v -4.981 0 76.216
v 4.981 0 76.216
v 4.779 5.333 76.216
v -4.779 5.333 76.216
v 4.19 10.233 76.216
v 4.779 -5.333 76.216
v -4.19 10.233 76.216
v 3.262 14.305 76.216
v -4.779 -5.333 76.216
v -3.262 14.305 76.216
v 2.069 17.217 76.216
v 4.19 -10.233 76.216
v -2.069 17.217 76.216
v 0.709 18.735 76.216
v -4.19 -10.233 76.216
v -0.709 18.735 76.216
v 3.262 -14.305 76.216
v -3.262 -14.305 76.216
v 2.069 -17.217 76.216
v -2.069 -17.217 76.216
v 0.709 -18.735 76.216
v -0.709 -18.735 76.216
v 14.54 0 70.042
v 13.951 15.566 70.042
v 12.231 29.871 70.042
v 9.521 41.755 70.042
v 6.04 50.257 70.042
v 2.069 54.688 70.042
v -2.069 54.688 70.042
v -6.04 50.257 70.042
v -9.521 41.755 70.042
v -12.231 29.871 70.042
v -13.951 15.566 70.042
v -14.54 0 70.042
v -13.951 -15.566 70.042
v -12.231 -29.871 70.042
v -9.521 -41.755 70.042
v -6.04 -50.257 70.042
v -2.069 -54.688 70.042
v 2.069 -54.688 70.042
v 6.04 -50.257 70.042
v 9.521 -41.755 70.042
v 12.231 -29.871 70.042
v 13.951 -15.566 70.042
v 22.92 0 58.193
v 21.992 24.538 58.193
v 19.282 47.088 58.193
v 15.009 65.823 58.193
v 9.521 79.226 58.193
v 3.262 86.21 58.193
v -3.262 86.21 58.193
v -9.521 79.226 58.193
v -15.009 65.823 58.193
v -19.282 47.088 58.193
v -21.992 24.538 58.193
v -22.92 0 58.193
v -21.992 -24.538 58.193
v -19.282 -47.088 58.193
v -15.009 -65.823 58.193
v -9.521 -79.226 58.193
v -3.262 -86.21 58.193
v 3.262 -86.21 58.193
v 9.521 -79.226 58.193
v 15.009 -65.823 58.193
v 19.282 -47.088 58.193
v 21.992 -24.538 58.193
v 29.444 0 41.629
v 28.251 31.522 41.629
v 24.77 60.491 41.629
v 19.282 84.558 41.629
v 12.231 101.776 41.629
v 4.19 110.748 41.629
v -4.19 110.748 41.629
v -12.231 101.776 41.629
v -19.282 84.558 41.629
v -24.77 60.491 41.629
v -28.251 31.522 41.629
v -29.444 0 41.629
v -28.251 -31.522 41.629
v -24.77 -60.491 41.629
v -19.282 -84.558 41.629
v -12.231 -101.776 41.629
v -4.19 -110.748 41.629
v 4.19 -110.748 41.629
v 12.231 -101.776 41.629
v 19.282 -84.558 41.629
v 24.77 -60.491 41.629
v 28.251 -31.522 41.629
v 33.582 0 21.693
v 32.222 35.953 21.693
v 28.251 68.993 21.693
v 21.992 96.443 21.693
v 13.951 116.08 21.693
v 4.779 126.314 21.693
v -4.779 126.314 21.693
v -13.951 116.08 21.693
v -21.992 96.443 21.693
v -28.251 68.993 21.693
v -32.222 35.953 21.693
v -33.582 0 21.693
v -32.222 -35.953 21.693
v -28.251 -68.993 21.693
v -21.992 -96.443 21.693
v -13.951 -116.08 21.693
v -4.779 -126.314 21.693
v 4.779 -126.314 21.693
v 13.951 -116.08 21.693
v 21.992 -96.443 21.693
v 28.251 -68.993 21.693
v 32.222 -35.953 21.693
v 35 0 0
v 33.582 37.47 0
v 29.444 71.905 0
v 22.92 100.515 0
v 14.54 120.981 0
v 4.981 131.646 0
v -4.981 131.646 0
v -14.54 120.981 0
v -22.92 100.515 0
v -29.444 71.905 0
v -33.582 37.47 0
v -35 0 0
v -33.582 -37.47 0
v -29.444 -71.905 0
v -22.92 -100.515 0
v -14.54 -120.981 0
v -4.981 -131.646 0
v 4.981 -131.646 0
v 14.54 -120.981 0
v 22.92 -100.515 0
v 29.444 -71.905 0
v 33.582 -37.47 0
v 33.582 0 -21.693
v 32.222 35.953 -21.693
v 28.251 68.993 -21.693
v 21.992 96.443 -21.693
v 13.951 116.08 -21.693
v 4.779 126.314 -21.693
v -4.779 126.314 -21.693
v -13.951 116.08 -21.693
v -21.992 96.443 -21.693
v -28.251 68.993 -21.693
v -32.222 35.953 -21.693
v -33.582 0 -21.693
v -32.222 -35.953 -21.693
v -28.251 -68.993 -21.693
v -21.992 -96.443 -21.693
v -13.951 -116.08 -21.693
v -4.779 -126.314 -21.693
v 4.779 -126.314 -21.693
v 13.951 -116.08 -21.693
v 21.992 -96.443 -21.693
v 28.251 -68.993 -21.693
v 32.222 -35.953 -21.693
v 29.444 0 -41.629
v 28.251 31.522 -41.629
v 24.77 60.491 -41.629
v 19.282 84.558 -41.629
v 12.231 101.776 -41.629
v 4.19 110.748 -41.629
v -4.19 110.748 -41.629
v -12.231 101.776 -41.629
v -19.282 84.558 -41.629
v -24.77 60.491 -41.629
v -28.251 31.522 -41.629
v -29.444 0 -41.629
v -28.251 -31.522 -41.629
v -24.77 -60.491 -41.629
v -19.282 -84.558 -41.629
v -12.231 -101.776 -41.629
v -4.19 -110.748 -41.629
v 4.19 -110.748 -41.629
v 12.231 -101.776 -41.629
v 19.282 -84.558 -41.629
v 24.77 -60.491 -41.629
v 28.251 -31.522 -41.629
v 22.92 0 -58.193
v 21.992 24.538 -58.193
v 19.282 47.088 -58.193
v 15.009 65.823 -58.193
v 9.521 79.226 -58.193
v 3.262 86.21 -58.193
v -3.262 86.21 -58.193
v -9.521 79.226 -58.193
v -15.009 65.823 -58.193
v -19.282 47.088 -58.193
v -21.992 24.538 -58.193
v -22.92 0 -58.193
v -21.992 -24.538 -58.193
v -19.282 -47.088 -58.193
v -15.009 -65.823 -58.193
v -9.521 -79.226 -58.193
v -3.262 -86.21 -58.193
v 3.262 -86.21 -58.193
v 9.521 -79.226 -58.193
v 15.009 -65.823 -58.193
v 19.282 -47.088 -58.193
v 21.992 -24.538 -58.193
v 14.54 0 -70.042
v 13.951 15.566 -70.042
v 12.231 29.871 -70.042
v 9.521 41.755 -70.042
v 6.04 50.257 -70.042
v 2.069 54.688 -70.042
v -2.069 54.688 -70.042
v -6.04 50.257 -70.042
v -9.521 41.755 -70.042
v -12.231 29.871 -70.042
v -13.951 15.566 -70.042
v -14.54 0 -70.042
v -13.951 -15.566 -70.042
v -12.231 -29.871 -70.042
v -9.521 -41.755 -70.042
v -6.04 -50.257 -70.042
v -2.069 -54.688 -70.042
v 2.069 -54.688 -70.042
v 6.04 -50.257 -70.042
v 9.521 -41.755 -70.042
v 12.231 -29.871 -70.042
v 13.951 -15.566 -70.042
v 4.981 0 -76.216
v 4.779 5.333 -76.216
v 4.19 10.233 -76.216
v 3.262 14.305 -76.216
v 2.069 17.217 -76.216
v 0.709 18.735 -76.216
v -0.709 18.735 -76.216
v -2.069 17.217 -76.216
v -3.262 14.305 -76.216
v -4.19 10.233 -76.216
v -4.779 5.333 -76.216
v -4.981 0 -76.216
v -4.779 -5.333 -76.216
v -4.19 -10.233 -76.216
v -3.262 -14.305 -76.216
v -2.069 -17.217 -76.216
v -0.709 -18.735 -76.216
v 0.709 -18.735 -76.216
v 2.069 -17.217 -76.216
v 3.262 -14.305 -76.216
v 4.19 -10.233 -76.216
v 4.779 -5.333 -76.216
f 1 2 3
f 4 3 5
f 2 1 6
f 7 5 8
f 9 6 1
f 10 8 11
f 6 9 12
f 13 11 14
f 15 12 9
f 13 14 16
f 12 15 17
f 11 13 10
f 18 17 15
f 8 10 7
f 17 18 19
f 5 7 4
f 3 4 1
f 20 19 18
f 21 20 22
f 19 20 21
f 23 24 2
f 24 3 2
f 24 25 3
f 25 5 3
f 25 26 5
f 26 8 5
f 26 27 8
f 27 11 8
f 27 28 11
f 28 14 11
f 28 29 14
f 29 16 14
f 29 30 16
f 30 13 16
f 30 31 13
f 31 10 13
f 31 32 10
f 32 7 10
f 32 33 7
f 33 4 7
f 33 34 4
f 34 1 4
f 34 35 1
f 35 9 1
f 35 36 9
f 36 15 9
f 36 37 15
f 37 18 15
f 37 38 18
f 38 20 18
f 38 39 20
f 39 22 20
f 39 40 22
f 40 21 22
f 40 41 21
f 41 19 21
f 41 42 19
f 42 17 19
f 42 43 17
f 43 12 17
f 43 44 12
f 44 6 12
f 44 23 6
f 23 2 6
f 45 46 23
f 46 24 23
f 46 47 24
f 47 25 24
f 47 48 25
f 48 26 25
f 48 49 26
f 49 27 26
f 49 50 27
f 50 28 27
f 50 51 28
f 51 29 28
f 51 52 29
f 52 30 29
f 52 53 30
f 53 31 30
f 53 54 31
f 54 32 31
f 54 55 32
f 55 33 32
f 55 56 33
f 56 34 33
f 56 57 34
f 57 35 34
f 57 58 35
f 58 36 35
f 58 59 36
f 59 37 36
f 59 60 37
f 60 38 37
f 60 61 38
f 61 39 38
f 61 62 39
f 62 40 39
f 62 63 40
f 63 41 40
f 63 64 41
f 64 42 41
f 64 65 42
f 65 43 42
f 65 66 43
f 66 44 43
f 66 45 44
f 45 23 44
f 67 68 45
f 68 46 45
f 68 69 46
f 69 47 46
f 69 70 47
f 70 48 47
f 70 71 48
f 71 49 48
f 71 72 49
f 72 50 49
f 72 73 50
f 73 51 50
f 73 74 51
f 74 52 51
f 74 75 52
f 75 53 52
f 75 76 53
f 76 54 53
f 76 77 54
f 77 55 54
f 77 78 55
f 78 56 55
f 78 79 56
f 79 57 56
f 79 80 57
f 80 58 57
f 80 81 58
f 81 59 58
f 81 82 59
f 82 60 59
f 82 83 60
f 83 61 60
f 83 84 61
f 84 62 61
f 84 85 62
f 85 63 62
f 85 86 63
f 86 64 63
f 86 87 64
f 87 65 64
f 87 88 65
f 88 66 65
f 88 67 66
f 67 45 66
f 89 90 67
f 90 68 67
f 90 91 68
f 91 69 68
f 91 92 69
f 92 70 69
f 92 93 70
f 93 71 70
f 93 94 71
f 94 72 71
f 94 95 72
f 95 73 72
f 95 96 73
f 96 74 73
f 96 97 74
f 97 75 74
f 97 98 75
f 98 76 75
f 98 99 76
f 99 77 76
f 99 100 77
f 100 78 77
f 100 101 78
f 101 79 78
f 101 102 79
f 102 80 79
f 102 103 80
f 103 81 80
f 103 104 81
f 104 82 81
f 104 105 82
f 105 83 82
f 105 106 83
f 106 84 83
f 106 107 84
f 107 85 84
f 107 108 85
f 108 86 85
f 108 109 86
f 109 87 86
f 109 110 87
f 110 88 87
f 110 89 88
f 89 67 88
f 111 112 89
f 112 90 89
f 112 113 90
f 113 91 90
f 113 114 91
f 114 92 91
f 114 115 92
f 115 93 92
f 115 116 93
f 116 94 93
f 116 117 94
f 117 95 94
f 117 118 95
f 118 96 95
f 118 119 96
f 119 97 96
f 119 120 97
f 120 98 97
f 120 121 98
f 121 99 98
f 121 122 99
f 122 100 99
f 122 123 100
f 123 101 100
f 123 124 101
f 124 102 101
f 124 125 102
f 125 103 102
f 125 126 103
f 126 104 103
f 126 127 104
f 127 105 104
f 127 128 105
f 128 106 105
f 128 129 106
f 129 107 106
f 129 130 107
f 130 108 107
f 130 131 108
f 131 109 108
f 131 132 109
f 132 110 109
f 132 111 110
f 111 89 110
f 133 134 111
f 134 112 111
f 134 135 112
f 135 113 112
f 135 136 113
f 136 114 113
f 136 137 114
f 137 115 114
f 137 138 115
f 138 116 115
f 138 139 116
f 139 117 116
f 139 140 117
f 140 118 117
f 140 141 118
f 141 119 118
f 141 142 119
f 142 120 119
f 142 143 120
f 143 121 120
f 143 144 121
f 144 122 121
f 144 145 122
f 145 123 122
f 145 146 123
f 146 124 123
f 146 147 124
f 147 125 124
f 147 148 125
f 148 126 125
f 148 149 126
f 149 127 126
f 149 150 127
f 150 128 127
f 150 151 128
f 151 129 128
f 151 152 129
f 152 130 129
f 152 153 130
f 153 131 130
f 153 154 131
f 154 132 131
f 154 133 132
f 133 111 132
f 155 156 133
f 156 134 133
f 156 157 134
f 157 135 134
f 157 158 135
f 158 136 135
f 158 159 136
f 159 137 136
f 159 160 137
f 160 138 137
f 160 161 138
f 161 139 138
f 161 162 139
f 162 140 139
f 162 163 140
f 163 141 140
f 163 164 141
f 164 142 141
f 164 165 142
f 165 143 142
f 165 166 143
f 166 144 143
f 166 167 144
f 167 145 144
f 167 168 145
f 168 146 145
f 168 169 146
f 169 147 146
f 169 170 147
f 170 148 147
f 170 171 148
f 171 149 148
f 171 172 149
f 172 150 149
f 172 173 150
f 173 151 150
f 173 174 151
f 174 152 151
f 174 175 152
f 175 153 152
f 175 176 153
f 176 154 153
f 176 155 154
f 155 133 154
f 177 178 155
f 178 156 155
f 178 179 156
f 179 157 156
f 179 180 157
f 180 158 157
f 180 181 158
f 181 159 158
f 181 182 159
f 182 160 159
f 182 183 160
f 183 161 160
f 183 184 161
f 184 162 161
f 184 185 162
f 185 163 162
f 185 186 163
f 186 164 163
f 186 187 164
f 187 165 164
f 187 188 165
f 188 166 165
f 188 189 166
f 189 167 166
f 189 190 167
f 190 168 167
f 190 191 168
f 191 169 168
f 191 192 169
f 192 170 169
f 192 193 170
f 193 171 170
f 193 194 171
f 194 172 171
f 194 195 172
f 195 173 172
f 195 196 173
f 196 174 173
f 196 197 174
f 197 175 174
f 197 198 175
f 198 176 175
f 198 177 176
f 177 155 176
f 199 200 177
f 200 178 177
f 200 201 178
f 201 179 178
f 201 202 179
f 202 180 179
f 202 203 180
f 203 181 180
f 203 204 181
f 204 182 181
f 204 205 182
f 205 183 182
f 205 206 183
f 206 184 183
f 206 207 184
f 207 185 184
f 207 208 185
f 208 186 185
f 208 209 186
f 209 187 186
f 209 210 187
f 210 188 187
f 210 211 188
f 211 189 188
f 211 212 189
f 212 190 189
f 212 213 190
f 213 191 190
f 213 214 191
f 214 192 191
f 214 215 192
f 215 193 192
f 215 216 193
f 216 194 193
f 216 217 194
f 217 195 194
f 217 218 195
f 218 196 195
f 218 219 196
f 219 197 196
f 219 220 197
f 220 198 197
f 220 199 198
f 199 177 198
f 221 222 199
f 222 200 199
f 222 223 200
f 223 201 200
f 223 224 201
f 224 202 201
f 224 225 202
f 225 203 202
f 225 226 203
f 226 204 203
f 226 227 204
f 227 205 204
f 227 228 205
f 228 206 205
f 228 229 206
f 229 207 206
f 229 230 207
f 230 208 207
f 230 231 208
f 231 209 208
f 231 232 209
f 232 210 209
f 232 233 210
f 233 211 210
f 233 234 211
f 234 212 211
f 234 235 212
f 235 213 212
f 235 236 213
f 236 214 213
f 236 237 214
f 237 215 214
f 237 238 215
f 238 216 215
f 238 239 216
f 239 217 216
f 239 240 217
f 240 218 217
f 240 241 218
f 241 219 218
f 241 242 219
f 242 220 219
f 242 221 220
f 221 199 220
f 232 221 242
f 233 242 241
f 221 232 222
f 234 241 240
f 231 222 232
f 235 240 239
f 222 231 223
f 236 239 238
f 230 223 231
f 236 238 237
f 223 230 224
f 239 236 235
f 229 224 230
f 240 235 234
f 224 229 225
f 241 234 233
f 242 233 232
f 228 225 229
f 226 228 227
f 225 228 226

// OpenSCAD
// Generated by SolidPython 1.0.1 on 2020-07-29 00:46:47


scale(v = [5, 19, 11]) {
	sphere(r = 7);
}
/***********************************************
*********      SolidPython code:      **********
************************************************
 
# import packages: SolidPython
from solid import *
from solid.utils import *
from itertools import chain, combinations, permutations


class Resize:

    def __init__(self, scad_file):
        self.scad_file = scad_file
        #self.scad_file = import_scad(scad_file)
        # cone/cylinder param:
        self.r1 = 0
        self.r2 = 0
        self.h = 0
        # rectangular prism param:
        self.w = 0
        self.l = 0
        # ellipse param:
        self.r = 0

    # import OpenScad code (file name corresponds to shape)


    # classify shape + parameters
    def assign(self, param1, param2, param3):
        if self.scad_file == 'cone.scad':
            self.r1 = param1
            self.r2 = param2
            self.h = param3
        elif self.scad_file == 'cylinder.scad':
            self.r1 = param1
            self.r2 = param2
            self.h = param3
        elif self.scad_file == 'rectangularPrism.scad':
            self.h = param1
            self.l = param2
            self.w = param3
        else:
            self.r = param1
            self.h = param2

    # resize parameters
    def iterate(self):
        x = range(3, 20, 2)
        i = 1
        if self.scad_file == 'cone.scad':
            tempList = list(permutations(x, 2))
            for temp in tempList:
                param1 = temp[0]
                param2 = temp[1]
                filepath = 'produced_scad_files/' + 'cone' + str(param1) + '_' + str(param2) + '_' + '.scad'
                scad_render_to_file(cylinder(h=param1, r1=param2, r2=0), filepath)

        elif self.scad_file == 'cylinder.scad':
            tempList = list(permutations(x, 3))
            for temp in tempList:
                param1 = temp[0]
                param2 = temp[1]
                filepath = 'produced_scad_files/' + 'cylinder' + str(param1) + '_' + str(param2) + '_' + '.scad'
                scad_render_to_file(cylinder(h=param1, r1=param2, r2=param2), filepath)

        elif self.scad_file == 'rectangularPrism.scad':
            tempList = list(permutations(x, 3))
            for temp in tempList:
                param1 = temp[0]
                param2 = temp[1]
                param3 = temp[2]
                filepath = 'produced_scad_files/' + 'rectangularPrism' + str(param1) + '_' + str(param2) + '_' + str(
                    param3) + '.scad'
                scad_render_to_file(cube(size=(param1, param2, param3)), filepath)

        elif self.scad_file == 'ellipse.scad':
            tempList = list(permutations(x, 4))
            for temp in tempList:
                param1 = temp[0]
                param2 = temp[1]
                param3 = temp[2]
                param4 = temp[3]
                filepath = 'produced_scad_files/' + 'ellipse' + str(param1) + '_' + str(param2) + '_' + str(param3) + '_' + str(param4) + '.scad'
                scad_render_to_file(scale([param1, param2, param3])(sphere(r=param4)), filepath)

    def render_to_scadfile(self):
        scad_render_to_file(scad, 'example.scad') 
 
************************************************/
